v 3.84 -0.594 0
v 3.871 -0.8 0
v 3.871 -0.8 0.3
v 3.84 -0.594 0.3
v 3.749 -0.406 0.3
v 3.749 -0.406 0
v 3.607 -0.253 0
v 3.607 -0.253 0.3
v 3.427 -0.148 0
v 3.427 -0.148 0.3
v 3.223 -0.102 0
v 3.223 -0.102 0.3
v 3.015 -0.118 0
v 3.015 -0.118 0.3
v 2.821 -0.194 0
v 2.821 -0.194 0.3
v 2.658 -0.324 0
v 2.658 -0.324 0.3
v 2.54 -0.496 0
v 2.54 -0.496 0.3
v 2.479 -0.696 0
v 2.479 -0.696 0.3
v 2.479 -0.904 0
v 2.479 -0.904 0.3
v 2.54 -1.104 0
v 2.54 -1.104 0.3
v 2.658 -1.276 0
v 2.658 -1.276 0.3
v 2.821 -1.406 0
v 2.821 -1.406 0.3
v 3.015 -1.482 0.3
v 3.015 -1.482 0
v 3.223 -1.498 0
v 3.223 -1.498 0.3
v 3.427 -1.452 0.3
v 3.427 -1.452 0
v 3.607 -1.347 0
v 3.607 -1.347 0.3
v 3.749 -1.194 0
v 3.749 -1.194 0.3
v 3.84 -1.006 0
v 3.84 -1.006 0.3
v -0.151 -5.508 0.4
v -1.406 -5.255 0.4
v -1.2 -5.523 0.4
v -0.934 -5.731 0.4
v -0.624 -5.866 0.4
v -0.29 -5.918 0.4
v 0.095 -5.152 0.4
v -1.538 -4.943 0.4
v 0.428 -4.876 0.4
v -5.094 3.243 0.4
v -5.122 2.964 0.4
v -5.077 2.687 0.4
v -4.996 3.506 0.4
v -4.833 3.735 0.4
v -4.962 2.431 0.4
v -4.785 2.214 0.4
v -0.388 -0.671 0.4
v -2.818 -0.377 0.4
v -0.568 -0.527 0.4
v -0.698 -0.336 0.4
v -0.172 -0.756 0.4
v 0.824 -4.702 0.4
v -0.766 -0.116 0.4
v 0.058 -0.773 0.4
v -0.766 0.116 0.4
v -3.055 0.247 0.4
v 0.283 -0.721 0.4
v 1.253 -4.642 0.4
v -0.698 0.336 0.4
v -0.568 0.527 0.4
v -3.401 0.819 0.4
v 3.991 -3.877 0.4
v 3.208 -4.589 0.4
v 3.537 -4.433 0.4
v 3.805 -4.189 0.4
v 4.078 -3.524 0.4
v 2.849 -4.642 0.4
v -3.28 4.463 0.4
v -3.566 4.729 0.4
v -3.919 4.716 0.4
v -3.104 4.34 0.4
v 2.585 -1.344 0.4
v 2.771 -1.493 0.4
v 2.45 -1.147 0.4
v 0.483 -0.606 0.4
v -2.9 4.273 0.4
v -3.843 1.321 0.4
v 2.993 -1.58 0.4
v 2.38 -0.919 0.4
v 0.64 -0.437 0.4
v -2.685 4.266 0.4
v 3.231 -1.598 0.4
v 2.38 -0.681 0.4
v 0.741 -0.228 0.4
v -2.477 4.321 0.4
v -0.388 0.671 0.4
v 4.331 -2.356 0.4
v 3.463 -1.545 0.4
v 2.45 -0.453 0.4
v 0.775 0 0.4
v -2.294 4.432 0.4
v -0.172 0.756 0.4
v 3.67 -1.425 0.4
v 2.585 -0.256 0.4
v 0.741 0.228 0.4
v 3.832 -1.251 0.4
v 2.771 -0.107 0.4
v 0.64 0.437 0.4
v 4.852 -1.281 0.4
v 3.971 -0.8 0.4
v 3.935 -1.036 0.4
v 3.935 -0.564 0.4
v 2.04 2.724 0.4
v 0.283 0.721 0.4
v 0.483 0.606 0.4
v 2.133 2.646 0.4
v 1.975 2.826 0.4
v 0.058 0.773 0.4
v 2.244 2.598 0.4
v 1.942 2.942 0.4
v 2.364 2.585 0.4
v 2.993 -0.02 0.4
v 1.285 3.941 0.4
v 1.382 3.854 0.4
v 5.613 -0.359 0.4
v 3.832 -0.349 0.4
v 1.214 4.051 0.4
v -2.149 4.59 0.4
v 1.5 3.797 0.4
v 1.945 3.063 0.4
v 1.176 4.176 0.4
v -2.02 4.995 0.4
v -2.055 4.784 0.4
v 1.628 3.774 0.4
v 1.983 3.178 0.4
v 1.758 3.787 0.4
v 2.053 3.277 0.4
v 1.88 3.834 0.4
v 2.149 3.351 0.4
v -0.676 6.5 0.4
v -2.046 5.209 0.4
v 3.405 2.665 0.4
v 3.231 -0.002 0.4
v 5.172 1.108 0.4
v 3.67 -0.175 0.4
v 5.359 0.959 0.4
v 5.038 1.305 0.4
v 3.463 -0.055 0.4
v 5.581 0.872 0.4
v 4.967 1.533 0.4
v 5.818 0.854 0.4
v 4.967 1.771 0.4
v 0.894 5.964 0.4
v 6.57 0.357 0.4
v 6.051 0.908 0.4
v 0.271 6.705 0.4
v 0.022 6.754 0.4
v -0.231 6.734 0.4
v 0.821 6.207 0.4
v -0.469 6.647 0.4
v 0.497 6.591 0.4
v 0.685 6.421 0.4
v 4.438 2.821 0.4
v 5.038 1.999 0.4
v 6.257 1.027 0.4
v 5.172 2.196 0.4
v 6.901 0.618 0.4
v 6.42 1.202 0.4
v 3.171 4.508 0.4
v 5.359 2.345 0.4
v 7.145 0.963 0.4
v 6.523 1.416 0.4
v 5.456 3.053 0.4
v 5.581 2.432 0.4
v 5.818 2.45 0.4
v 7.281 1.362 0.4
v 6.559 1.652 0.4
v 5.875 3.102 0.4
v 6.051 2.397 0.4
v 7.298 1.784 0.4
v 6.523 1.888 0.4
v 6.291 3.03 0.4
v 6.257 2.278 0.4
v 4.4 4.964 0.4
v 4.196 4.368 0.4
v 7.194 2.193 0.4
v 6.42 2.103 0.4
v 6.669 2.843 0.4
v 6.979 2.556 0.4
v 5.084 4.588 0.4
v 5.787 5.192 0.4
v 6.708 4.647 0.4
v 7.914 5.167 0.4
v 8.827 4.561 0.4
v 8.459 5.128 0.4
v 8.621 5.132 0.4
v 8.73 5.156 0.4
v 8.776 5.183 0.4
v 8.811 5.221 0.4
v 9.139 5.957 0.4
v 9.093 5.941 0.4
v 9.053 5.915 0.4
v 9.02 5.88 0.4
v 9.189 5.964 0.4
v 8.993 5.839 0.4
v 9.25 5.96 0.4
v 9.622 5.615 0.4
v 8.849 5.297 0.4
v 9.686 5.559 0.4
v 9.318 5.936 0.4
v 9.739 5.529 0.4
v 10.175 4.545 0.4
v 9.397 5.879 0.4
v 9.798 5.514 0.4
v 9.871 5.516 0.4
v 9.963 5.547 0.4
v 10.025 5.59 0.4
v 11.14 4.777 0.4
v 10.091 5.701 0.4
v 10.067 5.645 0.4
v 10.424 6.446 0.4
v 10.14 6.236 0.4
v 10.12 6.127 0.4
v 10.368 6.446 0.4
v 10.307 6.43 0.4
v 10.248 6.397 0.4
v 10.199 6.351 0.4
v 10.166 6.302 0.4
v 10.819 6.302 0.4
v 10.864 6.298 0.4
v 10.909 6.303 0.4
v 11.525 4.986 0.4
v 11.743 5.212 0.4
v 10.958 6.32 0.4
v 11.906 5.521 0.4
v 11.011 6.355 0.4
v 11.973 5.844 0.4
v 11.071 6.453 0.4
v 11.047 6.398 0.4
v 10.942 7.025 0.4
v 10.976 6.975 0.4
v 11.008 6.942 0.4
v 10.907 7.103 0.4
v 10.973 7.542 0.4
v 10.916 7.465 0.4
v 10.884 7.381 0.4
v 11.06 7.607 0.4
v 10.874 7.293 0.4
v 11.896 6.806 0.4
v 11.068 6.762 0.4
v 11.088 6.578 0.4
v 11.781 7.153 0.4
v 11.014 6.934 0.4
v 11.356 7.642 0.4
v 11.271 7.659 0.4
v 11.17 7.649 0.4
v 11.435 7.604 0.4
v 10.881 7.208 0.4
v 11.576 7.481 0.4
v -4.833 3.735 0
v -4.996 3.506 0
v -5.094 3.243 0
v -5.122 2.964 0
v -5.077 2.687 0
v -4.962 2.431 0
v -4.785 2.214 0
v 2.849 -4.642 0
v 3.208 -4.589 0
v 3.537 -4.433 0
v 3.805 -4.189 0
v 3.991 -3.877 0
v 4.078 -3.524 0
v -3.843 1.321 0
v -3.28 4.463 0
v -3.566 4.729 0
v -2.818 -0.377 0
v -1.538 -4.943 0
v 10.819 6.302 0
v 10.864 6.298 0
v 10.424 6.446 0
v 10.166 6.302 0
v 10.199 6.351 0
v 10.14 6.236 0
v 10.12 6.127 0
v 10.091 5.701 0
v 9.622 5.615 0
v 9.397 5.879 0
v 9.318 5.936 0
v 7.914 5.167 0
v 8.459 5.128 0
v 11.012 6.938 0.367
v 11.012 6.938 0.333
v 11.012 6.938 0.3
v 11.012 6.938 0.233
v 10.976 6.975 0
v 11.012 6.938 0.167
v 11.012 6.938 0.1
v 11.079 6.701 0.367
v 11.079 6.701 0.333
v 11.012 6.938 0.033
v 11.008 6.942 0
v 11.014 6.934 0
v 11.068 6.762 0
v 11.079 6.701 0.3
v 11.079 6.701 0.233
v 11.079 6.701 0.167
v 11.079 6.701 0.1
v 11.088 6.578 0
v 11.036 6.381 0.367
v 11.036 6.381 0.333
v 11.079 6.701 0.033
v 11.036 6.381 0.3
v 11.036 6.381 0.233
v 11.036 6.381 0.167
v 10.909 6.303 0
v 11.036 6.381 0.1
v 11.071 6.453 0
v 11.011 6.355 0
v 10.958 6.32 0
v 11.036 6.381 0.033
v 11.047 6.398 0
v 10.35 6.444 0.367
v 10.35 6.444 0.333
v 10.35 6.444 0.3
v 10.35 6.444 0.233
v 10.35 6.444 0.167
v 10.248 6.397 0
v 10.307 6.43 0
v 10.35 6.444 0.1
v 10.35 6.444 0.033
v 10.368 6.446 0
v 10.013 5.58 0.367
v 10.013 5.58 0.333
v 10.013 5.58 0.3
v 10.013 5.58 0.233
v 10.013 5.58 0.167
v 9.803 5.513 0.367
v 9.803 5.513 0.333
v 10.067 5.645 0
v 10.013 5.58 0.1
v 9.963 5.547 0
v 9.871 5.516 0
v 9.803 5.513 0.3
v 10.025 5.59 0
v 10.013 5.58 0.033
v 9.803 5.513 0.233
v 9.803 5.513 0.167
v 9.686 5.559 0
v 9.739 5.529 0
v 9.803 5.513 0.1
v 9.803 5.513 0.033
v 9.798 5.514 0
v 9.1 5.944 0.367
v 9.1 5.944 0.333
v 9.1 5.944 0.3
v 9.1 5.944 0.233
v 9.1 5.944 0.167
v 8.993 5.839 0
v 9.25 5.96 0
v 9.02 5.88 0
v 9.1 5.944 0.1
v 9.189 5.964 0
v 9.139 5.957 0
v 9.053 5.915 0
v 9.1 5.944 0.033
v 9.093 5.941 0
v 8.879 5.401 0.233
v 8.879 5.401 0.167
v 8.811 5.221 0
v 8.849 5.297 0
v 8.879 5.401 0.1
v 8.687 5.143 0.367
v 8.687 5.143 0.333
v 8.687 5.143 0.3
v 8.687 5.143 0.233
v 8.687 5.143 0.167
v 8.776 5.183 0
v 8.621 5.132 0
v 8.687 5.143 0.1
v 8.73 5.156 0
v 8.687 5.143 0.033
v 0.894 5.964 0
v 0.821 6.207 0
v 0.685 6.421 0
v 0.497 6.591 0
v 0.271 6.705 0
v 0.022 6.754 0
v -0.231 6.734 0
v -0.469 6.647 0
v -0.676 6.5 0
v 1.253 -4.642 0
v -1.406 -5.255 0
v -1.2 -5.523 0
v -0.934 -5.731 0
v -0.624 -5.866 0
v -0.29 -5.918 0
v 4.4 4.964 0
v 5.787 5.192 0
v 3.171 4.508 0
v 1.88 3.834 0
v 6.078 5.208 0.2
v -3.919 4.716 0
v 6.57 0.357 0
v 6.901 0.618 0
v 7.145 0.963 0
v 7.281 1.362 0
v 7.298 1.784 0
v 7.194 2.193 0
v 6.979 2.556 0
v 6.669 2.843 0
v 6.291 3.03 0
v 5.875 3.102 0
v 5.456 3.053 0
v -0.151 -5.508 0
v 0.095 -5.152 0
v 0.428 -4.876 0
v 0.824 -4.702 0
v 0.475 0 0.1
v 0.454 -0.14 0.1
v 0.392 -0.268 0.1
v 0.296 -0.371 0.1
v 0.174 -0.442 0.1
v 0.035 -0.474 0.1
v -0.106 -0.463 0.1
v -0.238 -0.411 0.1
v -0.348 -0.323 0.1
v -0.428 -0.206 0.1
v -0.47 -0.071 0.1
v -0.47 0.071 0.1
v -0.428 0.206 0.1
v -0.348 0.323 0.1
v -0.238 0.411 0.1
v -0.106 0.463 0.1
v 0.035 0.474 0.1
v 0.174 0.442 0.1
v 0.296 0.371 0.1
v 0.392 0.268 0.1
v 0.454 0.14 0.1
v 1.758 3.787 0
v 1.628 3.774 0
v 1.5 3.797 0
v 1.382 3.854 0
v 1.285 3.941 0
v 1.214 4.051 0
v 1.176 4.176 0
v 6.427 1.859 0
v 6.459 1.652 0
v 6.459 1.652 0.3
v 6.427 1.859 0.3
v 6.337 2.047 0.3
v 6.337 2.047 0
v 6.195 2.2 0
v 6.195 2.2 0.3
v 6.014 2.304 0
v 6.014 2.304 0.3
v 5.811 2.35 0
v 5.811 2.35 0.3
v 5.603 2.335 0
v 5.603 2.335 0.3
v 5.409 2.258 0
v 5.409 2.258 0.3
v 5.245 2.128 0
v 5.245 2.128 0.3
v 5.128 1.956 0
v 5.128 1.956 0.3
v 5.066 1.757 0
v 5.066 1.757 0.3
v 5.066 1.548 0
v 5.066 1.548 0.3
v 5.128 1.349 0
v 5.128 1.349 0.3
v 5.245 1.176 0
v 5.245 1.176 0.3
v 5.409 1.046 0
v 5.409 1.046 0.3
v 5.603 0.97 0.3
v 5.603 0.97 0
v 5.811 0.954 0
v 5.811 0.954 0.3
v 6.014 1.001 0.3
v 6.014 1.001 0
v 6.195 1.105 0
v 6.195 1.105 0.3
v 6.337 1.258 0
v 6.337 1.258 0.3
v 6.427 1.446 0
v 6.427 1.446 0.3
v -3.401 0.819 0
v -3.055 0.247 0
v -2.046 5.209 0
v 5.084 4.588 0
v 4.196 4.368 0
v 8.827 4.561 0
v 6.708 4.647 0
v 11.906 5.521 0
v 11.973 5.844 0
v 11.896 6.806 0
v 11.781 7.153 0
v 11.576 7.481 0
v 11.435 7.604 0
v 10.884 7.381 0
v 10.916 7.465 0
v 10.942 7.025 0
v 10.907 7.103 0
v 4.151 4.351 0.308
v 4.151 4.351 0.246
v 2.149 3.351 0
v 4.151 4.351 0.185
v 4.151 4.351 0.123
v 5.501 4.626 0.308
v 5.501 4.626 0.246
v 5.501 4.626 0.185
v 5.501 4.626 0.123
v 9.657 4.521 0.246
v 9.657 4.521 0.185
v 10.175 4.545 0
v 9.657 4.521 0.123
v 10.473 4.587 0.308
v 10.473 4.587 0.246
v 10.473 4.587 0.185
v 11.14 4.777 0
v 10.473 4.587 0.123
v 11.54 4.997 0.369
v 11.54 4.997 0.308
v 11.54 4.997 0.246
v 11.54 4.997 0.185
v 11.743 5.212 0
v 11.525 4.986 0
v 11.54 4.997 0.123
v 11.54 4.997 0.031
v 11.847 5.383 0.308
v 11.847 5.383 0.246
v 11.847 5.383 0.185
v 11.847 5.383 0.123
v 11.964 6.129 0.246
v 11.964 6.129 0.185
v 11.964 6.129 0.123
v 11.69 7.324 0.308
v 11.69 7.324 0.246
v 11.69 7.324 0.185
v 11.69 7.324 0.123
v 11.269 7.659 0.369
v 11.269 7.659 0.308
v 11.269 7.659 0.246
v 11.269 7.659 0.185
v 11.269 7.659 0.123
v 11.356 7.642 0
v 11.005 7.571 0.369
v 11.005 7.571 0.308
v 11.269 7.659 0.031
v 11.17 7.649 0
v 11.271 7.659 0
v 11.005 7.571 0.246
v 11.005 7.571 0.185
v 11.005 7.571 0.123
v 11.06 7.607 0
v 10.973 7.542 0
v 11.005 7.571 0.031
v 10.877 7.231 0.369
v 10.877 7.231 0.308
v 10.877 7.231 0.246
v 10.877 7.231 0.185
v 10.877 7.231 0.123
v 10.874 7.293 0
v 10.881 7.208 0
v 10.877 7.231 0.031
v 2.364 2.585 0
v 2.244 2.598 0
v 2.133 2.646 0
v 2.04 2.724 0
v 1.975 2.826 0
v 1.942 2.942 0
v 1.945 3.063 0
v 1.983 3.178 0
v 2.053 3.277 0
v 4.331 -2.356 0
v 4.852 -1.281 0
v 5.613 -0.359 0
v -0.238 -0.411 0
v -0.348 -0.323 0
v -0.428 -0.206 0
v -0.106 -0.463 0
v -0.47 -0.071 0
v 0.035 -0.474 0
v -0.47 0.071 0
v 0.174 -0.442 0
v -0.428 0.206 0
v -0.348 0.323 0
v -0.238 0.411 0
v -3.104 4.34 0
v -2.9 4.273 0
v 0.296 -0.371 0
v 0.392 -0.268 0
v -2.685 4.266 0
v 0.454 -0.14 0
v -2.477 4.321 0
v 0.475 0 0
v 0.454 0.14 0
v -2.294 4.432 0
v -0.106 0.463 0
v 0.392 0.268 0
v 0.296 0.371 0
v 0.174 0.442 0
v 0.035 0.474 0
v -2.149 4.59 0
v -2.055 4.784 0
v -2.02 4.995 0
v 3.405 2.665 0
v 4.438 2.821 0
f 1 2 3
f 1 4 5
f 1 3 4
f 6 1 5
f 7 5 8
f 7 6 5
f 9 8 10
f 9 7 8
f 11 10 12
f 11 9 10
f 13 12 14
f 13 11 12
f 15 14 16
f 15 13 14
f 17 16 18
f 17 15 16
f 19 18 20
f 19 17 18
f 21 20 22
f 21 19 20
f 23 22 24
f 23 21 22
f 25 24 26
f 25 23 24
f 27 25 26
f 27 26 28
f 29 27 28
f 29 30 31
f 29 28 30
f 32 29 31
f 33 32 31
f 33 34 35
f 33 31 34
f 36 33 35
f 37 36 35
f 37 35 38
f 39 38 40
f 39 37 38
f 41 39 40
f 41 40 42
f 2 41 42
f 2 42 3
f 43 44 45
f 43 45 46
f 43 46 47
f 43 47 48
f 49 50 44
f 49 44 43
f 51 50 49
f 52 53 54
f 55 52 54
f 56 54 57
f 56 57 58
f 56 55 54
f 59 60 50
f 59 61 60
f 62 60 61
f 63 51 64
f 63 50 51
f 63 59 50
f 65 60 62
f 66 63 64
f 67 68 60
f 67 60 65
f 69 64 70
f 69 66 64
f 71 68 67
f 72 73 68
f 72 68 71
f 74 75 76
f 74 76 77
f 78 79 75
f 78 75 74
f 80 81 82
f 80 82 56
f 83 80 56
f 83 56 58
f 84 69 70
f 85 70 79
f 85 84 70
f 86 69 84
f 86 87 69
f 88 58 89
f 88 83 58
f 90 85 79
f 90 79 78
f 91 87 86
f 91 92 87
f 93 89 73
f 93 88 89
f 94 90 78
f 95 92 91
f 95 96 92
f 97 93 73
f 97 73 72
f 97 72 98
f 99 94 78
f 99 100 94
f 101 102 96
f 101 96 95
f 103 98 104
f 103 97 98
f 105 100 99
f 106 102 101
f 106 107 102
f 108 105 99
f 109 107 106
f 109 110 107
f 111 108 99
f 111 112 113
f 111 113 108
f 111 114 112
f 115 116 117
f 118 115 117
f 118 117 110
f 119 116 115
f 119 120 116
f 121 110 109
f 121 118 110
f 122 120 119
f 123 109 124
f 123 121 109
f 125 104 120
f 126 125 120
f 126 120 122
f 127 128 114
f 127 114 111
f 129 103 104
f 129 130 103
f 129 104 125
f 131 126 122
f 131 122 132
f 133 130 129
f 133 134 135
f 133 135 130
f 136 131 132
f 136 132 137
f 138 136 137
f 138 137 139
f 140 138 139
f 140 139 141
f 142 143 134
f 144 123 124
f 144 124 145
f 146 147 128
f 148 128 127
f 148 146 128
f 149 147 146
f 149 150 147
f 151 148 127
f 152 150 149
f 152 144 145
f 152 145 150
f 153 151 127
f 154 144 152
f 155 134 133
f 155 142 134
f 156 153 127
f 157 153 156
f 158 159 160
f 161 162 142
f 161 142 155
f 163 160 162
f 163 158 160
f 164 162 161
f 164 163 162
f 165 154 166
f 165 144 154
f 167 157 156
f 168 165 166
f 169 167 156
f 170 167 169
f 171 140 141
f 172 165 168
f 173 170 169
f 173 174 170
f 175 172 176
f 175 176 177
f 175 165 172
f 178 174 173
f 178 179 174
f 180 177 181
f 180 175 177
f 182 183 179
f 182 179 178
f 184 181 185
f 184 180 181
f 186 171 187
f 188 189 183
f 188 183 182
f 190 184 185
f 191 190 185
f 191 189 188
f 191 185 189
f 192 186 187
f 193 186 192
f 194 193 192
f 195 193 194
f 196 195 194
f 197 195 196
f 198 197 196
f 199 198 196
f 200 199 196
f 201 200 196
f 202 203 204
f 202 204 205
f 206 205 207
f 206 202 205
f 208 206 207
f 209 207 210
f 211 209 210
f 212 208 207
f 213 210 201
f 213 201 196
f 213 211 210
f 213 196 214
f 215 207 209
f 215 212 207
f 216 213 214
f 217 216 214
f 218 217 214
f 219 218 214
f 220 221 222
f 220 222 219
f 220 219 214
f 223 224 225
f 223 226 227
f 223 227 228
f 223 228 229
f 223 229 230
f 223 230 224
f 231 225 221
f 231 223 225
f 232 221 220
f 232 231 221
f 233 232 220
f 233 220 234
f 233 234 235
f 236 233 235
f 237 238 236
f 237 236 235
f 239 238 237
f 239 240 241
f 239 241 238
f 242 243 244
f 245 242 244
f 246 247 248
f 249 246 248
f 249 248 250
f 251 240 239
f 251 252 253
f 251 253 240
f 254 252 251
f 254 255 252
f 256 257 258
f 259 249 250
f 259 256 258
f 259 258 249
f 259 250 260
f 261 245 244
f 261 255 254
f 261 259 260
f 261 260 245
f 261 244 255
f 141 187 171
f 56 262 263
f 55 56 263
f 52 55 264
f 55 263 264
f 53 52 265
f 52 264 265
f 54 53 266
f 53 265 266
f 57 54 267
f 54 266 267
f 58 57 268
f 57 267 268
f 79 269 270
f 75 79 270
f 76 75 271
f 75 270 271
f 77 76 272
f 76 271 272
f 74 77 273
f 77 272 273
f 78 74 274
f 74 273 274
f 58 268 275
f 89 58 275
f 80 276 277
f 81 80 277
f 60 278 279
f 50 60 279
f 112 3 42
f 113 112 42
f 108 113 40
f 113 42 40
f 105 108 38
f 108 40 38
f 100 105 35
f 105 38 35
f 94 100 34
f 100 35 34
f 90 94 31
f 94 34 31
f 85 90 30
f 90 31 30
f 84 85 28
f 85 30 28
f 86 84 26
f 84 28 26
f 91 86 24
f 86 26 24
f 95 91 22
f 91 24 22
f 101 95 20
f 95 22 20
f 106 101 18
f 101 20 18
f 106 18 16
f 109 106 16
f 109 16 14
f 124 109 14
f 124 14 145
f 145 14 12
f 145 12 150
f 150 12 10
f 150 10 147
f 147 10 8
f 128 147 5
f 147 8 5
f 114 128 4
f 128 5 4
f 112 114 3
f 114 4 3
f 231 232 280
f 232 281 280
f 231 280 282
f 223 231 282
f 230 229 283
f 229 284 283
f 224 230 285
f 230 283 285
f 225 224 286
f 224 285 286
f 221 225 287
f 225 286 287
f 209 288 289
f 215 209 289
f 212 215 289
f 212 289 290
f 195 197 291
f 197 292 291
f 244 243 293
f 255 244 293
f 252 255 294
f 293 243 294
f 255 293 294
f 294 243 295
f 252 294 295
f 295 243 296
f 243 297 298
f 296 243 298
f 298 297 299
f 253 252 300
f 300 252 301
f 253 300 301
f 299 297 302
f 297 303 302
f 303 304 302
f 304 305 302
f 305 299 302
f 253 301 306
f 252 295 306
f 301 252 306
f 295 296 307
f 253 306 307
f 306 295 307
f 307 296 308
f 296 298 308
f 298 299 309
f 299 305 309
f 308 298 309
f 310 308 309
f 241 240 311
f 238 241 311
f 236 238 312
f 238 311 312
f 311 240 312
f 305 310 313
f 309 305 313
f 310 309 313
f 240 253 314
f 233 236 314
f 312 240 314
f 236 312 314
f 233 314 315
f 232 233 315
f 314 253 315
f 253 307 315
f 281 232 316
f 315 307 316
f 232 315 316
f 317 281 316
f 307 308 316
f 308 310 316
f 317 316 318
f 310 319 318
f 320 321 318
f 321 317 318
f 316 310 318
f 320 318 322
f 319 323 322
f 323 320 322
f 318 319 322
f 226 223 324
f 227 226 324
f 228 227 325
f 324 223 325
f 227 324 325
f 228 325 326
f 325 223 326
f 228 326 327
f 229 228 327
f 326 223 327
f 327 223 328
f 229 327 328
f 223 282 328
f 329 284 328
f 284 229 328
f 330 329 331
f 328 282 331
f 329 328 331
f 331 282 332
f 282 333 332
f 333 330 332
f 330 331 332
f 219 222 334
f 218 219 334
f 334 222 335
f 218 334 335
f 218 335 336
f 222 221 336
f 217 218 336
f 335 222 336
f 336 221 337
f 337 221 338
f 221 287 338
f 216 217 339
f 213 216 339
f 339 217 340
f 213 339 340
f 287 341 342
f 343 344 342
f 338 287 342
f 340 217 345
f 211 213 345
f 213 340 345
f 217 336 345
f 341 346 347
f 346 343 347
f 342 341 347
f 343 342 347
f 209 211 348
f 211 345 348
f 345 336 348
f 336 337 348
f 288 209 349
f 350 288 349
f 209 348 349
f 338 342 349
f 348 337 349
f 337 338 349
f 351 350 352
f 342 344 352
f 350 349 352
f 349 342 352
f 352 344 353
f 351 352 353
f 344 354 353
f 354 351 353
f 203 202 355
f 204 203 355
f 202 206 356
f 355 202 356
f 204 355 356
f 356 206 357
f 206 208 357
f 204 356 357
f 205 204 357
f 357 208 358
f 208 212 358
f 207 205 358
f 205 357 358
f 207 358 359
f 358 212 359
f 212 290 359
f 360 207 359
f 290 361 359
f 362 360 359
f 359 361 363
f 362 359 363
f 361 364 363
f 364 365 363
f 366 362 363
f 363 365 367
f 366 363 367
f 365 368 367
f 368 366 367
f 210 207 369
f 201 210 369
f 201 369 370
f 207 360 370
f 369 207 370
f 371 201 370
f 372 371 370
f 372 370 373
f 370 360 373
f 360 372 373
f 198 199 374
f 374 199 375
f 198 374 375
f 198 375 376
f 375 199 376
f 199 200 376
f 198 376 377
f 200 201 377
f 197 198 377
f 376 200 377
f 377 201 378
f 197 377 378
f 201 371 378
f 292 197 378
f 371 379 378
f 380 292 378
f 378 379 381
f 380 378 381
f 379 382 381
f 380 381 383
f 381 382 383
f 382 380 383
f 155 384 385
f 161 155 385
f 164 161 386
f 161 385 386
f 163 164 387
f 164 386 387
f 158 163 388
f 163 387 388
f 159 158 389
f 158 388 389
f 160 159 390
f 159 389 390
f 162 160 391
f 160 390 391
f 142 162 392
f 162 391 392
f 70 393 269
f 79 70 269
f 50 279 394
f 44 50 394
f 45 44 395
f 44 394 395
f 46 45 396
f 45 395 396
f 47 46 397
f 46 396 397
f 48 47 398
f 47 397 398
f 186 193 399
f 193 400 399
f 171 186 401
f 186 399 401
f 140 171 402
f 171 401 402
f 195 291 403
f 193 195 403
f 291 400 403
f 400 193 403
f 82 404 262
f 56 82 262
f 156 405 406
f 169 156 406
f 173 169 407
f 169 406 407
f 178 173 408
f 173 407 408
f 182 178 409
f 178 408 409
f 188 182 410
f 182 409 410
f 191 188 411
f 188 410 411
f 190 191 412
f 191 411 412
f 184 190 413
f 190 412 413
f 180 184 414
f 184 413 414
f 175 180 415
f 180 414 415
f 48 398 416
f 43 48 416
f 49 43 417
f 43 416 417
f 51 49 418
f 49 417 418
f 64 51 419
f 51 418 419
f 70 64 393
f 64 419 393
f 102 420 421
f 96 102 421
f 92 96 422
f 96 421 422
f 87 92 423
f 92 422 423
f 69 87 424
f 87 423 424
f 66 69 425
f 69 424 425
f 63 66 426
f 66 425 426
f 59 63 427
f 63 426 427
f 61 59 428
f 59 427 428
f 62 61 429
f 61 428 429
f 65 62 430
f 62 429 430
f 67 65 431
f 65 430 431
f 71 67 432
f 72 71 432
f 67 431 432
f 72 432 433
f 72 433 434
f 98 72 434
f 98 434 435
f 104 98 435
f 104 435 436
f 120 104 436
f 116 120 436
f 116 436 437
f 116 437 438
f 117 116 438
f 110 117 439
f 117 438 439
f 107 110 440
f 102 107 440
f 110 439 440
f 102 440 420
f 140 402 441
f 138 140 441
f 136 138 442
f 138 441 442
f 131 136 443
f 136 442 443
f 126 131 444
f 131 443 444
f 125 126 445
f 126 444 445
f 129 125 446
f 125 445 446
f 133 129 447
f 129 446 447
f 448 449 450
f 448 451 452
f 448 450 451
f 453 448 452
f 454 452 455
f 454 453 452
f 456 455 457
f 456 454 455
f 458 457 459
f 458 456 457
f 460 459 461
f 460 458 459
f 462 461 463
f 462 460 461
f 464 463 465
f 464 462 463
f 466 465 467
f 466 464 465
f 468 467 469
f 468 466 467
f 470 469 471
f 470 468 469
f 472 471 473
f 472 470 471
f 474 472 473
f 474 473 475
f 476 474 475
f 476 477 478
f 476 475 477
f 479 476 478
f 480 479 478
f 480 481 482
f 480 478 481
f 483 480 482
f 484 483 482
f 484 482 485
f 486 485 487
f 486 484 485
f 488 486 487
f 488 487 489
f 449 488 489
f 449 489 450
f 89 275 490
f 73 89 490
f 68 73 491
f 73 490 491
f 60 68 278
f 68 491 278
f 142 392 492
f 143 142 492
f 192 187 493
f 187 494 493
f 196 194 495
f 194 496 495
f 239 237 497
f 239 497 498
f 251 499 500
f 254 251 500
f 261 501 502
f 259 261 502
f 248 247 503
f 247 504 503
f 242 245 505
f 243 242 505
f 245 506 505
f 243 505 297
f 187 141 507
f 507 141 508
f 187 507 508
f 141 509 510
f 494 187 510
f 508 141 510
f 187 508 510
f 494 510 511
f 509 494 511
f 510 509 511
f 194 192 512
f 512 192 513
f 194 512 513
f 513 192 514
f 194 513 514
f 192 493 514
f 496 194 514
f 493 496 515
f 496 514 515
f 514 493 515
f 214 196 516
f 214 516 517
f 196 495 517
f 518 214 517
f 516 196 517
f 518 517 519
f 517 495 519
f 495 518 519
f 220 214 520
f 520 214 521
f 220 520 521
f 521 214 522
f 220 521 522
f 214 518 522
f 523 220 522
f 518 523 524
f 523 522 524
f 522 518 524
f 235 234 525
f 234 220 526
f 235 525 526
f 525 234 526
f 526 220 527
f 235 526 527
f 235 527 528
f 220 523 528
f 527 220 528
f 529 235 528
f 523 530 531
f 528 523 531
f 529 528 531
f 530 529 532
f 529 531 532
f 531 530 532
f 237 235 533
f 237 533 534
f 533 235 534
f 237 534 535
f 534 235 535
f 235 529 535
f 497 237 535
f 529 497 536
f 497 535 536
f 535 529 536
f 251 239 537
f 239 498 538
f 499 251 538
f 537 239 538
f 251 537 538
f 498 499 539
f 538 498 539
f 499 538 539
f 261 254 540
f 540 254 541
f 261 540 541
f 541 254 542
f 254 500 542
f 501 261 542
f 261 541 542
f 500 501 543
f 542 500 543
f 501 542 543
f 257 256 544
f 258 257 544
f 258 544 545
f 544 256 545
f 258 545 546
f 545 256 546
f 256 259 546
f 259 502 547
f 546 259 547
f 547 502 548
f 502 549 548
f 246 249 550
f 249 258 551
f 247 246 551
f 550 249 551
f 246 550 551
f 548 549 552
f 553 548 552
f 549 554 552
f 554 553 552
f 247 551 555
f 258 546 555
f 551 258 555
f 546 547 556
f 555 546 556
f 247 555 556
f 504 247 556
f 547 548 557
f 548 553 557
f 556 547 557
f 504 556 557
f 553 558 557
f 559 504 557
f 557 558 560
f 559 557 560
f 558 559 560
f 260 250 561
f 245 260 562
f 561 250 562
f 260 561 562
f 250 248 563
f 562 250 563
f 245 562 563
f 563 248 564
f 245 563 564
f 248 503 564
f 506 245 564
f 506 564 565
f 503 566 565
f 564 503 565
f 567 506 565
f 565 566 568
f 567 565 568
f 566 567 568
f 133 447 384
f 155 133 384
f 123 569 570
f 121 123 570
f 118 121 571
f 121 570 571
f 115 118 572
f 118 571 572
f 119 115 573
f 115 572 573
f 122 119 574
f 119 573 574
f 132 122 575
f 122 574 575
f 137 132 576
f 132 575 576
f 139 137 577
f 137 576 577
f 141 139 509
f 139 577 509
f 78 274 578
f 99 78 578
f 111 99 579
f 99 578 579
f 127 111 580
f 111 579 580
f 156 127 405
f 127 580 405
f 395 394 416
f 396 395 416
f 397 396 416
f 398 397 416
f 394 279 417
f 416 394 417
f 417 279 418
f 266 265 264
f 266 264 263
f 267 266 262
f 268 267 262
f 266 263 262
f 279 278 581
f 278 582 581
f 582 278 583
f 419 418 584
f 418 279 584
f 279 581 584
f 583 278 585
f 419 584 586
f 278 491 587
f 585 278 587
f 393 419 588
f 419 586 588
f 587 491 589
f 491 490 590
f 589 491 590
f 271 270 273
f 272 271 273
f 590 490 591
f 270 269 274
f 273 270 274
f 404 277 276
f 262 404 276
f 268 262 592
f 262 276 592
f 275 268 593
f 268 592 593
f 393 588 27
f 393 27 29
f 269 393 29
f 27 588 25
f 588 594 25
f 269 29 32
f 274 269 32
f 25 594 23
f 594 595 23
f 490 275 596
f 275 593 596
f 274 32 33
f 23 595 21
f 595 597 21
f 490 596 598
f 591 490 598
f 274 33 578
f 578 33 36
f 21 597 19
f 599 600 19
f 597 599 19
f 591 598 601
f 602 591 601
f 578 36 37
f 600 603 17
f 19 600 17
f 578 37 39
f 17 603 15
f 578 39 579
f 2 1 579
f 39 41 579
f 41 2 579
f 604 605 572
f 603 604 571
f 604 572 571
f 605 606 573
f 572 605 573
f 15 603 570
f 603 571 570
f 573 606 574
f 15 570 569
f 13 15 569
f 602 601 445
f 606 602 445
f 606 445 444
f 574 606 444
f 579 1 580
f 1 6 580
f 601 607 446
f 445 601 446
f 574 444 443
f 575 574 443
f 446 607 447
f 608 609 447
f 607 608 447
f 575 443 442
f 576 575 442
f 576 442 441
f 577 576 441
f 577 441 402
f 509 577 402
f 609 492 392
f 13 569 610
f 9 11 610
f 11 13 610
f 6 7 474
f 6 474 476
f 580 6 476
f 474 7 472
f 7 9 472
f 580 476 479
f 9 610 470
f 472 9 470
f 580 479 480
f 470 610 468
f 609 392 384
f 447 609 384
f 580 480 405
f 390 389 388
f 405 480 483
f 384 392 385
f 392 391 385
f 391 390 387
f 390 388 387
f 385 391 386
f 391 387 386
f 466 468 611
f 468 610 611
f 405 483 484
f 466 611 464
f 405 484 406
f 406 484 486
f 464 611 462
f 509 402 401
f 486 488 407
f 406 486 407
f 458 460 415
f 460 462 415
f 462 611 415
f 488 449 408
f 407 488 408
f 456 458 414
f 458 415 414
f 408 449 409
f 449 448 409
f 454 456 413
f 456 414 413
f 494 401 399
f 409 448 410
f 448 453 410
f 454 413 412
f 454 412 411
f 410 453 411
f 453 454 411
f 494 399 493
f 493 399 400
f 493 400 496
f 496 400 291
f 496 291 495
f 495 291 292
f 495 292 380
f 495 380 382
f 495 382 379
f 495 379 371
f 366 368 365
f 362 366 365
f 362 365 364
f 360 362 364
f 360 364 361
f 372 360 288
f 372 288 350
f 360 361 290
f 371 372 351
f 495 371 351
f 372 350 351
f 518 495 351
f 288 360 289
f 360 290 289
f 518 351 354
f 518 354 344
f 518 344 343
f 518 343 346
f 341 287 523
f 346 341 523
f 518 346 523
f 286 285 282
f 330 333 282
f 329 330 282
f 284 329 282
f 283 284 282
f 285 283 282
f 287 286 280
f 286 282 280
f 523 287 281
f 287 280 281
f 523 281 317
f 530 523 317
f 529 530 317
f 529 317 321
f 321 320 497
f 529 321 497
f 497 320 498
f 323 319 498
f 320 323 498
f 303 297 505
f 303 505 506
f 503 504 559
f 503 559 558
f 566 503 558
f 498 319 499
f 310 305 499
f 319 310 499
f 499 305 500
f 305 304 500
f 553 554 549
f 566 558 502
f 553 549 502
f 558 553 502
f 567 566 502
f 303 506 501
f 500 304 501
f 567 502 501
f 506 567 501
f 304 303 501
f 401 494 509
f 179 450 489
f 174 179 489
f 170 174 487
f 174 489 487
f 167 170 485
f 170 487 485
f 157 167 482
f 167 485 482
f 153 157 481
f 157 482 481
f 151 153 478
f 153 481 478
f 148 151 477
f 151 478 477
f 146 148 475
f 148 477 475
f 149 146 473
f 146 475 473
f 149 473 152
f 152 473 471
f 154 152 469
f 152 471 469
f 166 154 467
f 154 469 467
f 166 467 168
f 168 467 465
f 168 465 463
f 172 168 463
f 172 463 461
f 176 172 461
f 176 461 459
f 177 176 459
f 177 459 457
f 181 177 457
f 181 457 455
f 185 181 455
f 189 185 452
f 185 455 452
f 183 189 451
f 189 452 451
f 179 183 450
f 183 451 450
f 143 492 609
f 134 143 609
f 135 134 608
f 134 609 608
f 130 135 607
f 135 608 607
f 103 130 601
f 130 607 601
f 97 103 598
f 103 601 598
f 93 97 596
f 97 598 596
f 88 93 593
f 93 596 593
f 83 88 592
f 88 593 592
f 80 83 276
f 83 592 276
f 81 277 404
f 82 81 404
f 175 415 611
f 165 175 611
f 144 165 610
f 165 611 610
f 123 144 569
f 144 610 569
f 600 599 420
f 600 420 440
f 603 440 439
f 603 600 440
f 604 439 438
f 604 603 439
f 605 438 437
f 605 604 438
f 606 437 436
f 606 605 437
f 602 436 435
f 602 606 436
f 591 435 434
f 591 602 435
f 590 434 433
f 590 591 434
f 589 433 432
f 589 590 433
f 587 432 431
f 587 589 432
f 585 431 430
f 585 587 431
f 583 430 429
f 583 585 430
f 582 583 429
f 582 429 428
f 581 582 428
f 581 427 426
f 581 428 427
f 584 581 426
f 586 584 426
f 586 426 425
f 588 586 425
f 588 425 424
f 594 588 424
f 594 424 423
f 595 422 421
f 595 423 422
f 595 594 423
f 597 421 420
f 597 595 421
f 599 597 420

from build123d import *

# Parameters (mm, degrees)
BOSS_EXTRUDE1_DEPTH = 0.4
CUT_EXTRUDE1_REACH  = 2.4
SKETCH3_R           = 0.7
SKETCH3_R_2         = 0.475
CHAMFER1_SIZE       = 0.3
CHAMFER2_SIZE       = 0.1


with BuildPart() as part:
    # Sketch2 → Boss-Extrude1 (new body)
    with BuildSketch(Plane.XY):
        with BuildLine():
            Line((-3.280398103, 4.462745585), (-3.565990423, 4.728614807))
            Line((-3.565990423, 4.728614807), (-3.919317908, 4.715978))
            Line((-3.919317908, 4.715978), (-4.832992025, 3.734524376))
            ThreePointArc((-4.832992025, 3.734524376), (-5.12214982, 2.964294444), (-4.785260956, 2.213713154))
            Line((-4.785260956, 2.213713154), (-3.842676047, 1.320701474))
            ThreePointArc((-3.842676047, 1.320701474), (-3.215226534, 0.54105722), (-2.817993583, -0.377498188))
            Line((-2.817993583, -0.377498188), (-1.53754924, -4.943216753))
            ThreePointArc((-1.53754924, -4.943216753), (-1.073683574, -5.635355957), (-0.289950936, -5.918183091))
            ThreePointArc((-0.289950936, -5.918183091), (0.25193027, -5.00258665), (1.253002544, -4.642300121))
            Line((1.253002544, -4.642300121), (2.849087927, -4.642300121))
            ThreePointArc((2.849087927, -4.642300121), (3.679862266, -4.320845809), (4.077899324, -3.523923368))
            ThreePointArc((4.077899324, -3.523923368), (4.85231519, -1.28067152), (6.569808396, 0.357045144))
            ThreePointArc((6.569808396, 0.357045144), (7.194200096, 2.193242558), (5.455515812, 3.0525812))
            ThreePointArc((5.455515812, 3.0525812), (3.922850556, 2.733187243), (2.364301002, 2.58486809))
            ThreePointArc((2.364301002, 2.58486809), (1.954271819, 2.882940849), (2.148944892, 3.350993939))
            add(Edge.make_bspline(
                [(2.148944892, 3.350993939), (3.990784733, 4.377520224), (5.054570061, 4.749802783), (8.07736743, 4.610978963), (9.974761322, 4.487633157), (10.876148009, 4.612836581), (11.735902337, 5.082456398), (12.006850802, 5.630036331), (11.964613234, 6.088635426), (11.94790868, 6.582788519), (11.87304344, 7.169933604), (11.401729955, 7.698486926), (11.118368123, 7.641989696), (10.754115113, 7.433057717), (10.907458245, 7.045791734), (10.976067116, 6.975470818)],
                knots=[0, 0, 0, 0, 0.257493957, 0.509771918, 0.556127038, 0.67270813, 0.696759207, 0.766109929, 0.785364364, 0.796025603, 0.872722322, 0.911006436, 0.922367481, 0.931266838, 1, 1, 1, 1], degree=3))
            add(Edge.make_bspline(
                [(10.976067116, 6.975470818), (11.007230213, 6.943530086), (11.030998053, 6.927054365), (11.183543858, 6.436582216), (10.768131907, 6.210766166), (10.47441157, 6.546566685), (9.985825305, 6.237253123), (10.261407754, 5.63356727), (9.601064093, 5.416768823), (9.461950055, 5.99879585), (8.953943464, 5.941908396), (8.933009984, 5.615882839), (8.804013969, 5.099917733), (8.766496746, 5.091849472), (7.913807767, 5.167072227)],
                knots=[0, 0, 0, 0, 0.010451217, 0.122621216, 0.15375913, 0.268566734, 0.304390747, 0.463925269, 0.50835561, 0.652283215, 0.681879221, 0.784525671, 0.800049609, 1, 1, 1, 1], degree=3))
            add(Edge.make_bspline(
                [(7.913807767, 5.167072227), (7.613807084, 5.193537772), (4.779102247, 5.338097215), (3.361548013, 4.659831765), (1.879760763, 3.833976266)],
                knots=[0, 0, 0, 0, 0.29225871, 1, 1, 1, 1], degree=3))
            ThreePointArc((1.879760763, 3.833976266), (1.438926959, 3.821696872), (1.176473936, 4.176102906))
            Line((1.176473936, 4.176102906), (0.893773186, 5.964125991))
            ThreePointArc((0.893773186, 5.964125991), (0.27063154, 6.705053748), (-0.675545506, 6.500045332))
            Line((-0.675545506, 6.500045332), (-2.045683245, 5.208641086))
            ThreePointArc((-2.045683245, 5.208641086), (-2.381555089, 4.369737403), (-3.280398103, 4.462745585))
        make_face()
    extrude(amount=BOSS_EXTRUDE1_DEPTH)

    # Sketch3 → Cut-Extrude1 (cut, up to next)
    with BuildSketch(Plane.XY, mode=Mode.PRIVATE) as cut_extrude1_sk1:
        with Locations((3.171, -0.8)):
            Circle(SKETCH3_R)
    cut_extrude1_tool1 = extrude(cut_extrude1_sk1.sketch, amount=CUT_EXTRUDE1_REACH, mode=Mode.PRIVATE) & part.part
    add(cut_extrude1_tool1.solids().sort_by_distance((3.171, -0.8, 0))[0], mode=Mode.SUBTRACT)
    # Sketch3 → Cut-Extrude1 (cut, up to next)
    with BuildSketch(Plane.XY, mode=Mode.PRIVATE) as cut_extrude1_sk2:
        Circle(SKETCH3_R_2)
    cut_extrude1_tool2 = extrude(cut_extrude1_sk2.sketch, amount=CUT_EXTRUDE1_REACH, mode=Mode.PRIVATE) & part.part
    add(cut_extrude1_tool2.solids().sort_by_distance((0, 0, 0))[0], mode=Mode.SUBTRACT)
    # Sketch3 → Cut-Extrude1 (cut, up to next)
    with BuildSketch(Plane.XY, mode=Mode.PRIVATE) as cut_extrude1_sk3:
        with Locations((5.758559264, 1.652224614)):
            Circle(SKETCH3_R)
    cut_extrude1_tool3 = extrude(cut_extrude1_sk3.sketch, amount=CUT_EXTRUDE1_REACH, mode=Mode.PRIVATE) & part.part
    add(cut_extrude1_tool3.solids().sort_by_distance((5.758559, 1.652225, 0))[0], mode=Mode.SUBTRACT)

    # Chamfer1
    chamfer1_edges = [part.edges().sort_by_distance(p)[0] for p in [
        (-0.475, 0, 0.4),
    ]]
    chamfer(chamfer1_edges, length=CHAMFER1_SIZE)

    # Chamfer2
    chamfer2_edges = [part.edges().sort_by_distance(p)[0] for p in [
        (2.471, -0.8, 0.4),
        (5.058559264, 1.652224614, 0.4),
    ]]
    chamfer(chamfer2_edges, length=CHAMFER2_SIZE)


solid = part.part
